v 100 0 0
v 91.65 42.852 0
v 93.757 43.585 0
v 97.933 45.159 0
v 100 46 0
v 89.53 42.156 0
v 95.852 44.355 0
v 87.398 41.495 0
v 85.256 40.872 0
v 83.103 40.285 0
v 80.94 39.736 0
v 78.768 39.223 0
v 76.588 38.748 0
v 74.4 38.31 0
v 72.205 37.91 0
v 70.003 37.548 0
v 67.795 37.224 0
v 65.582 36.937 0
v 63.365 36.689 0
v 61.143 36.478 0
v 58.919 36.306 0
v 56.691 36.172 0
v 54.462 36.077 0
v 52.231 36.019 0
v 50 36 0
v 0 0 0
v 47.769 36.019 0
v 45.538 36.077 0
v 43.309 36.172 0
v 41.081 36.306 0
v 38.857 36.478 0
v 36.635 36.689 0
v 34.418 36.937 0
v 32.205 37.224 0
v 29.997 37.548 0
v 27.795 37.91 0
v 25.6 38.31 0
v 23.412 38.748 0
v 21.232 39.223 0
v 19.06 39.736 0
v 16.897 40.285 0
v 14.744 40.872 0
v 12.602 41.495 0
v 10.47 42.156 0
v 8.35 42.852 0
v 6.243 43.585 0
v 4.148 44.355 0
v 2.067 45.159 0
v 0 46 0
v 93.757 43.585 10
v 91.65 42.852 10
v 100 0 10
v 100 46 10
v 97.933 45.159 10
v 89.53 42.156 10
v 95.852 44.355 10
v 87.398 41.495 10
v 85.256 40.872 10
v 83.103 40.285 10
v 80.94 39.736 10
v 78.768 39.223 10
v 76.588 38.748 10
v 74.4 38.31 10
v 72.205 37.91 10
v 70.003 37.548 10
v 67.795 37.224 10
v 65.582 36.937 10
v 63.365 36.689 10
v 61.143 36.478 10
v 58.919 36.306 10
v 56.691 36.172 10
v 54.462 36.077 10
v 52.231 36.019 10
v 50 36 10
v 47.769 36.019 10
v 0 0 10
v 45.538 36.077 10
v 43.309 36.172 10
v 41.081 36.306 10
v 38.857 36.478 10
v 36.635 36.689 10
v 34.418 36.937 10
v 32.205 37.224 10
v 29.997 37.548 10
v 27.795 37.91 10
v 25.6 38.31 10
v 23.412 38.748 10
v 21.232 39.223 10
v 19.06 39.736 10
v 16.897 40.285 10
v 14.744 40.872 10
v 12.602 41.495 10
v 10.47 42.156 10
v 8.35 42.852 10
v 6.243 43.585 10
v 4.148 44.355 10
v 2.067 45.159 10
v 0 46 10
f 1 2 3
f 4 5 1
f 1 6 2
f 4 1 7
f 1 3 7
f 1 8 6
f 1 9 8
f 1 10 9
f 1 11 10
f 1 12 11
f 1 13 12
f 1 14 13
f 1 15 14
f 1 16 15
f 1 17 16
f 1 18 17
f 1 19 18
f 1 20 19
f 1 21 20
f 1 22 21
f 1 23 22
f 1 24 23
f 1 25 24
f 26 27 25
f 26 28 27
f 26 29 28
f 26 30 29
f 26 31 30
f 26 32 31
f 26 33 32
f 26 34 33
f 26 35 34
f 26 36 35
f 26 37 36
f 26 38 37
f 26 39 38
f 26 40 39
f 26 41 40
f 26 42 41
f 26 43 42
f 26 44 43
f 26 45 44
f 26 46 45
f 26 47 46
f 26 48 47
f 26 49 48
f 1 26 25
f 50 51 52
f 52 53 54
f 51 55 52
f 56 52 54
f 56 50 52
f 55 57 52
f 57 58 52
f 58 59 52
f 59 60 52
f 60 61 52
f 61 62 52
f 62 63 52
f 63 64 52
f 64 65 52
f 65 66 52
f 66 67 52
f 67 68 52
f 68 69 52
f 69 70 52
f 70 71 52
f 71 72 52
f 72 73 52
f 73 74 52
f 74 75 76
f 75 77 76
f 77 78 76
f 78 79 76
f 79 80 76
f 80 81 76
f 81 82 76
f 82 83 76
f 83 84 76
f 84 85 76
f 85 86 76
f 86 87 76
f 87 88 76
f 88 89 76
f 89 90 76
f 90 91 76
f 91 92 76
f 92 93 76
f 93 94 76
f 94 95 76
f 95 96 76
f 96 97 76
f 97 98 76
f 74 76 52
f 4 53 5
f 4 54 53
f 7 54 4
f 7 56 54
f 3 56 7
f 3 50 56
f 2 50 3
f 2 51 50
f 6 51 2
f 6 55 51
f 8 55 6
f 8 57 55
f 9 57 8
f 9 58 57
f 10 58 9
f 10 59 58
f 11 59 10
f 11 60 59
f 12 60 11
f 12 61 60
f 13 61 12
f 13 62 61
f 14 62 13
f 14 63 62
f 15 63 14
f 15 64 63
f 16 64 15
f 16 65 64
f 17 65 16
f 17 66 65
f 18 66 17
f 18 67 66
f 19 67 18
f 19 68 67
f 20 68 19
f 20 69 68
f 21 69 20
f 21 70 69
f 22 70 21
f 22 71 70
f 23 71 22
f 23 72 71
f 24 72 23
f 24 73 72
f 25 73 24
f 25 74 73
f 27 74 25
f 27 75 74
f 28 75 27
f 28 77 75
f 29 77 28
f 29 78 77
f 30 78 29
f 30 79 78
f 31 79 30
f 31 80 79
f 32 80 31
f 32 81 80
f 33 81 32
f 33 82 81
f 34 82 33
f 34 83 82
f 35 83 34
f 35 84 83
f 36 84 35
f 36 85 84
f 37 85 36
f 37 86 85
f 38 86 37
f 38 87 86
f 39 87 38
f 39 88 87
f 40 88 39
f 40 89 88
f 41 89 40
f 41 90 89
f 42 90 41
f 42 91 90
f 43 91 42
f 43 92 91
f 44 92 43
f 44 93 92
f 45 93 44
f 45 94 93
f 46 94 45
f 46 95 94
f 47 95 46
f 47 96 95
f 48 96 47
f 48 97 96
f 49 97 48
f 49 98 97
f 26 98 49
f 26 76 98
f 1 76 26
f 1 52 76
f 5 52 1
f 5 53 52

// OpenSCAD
$fn = 32;

// ----------------------------------------------------------------------
// Arc profile plate: notch, 49 points
// ----------------------------------------------------------------------

// --- parameters (mm) ---
bar_l = 100;              // bar length, X
bar_w = 46;               // bar width, Y
notch_depth = 10;         // depth of the arc notch at mid-span
arc_r = 130;              // radius of the notch arc
arc_angle = 45.24;        // notch arc angle, degrees
arc_step = 1;             // sampling step of the notch arc, degrees
plate_t = 10;             // plate thickness, Z

profile = [[0, 0], [100, 0], [100, 46], [97.933, 45.159], [95.852, 44.355], [93.757, 43.585], [91.65, 42.852], [89.53, 42.156], [87.398, 41.495], [85.256, 40.872], [83.103, 40.285], [80.94, 39.736], [78.768, 39.223], [76.588, 38.748], [74.4, 38.31], [72.205, 37.91], [70.003, 37.548], [67.795, 37.224], [65.582, 36.937], [63.365, 36.689], [61.143, 36.478], [58.919, 36.306], [56.691, 36.172], [54.462, 36.077], [52.231, 36.019], [50, 36], [47.769, 36.019], [45.538, 36.077], [43.309, 36.172], [41.081, 36.306], [38.857, 36.478], [36.635, 36.689], [34.418, 36.937], [32.205, 37.224], [29.997, 37.548], [27.795, 37.91], [25.6, 38.31], [23.412, 38.748], [21.232, 39.223], [19.06, 39.736], [16.897, 40.285], [14.744, 40.872], [12.602, 41.495], [10.47, 42.156], [8.35, 42.852], [6.243, 43.585], [4.148, 44.355], [2.067, 45.159], [0, 46]];  // primary outline, 49 points, counter clockwise

// --- the one profile operation ---
linear_extrude(height = plate_t) polygon(points = profile);
